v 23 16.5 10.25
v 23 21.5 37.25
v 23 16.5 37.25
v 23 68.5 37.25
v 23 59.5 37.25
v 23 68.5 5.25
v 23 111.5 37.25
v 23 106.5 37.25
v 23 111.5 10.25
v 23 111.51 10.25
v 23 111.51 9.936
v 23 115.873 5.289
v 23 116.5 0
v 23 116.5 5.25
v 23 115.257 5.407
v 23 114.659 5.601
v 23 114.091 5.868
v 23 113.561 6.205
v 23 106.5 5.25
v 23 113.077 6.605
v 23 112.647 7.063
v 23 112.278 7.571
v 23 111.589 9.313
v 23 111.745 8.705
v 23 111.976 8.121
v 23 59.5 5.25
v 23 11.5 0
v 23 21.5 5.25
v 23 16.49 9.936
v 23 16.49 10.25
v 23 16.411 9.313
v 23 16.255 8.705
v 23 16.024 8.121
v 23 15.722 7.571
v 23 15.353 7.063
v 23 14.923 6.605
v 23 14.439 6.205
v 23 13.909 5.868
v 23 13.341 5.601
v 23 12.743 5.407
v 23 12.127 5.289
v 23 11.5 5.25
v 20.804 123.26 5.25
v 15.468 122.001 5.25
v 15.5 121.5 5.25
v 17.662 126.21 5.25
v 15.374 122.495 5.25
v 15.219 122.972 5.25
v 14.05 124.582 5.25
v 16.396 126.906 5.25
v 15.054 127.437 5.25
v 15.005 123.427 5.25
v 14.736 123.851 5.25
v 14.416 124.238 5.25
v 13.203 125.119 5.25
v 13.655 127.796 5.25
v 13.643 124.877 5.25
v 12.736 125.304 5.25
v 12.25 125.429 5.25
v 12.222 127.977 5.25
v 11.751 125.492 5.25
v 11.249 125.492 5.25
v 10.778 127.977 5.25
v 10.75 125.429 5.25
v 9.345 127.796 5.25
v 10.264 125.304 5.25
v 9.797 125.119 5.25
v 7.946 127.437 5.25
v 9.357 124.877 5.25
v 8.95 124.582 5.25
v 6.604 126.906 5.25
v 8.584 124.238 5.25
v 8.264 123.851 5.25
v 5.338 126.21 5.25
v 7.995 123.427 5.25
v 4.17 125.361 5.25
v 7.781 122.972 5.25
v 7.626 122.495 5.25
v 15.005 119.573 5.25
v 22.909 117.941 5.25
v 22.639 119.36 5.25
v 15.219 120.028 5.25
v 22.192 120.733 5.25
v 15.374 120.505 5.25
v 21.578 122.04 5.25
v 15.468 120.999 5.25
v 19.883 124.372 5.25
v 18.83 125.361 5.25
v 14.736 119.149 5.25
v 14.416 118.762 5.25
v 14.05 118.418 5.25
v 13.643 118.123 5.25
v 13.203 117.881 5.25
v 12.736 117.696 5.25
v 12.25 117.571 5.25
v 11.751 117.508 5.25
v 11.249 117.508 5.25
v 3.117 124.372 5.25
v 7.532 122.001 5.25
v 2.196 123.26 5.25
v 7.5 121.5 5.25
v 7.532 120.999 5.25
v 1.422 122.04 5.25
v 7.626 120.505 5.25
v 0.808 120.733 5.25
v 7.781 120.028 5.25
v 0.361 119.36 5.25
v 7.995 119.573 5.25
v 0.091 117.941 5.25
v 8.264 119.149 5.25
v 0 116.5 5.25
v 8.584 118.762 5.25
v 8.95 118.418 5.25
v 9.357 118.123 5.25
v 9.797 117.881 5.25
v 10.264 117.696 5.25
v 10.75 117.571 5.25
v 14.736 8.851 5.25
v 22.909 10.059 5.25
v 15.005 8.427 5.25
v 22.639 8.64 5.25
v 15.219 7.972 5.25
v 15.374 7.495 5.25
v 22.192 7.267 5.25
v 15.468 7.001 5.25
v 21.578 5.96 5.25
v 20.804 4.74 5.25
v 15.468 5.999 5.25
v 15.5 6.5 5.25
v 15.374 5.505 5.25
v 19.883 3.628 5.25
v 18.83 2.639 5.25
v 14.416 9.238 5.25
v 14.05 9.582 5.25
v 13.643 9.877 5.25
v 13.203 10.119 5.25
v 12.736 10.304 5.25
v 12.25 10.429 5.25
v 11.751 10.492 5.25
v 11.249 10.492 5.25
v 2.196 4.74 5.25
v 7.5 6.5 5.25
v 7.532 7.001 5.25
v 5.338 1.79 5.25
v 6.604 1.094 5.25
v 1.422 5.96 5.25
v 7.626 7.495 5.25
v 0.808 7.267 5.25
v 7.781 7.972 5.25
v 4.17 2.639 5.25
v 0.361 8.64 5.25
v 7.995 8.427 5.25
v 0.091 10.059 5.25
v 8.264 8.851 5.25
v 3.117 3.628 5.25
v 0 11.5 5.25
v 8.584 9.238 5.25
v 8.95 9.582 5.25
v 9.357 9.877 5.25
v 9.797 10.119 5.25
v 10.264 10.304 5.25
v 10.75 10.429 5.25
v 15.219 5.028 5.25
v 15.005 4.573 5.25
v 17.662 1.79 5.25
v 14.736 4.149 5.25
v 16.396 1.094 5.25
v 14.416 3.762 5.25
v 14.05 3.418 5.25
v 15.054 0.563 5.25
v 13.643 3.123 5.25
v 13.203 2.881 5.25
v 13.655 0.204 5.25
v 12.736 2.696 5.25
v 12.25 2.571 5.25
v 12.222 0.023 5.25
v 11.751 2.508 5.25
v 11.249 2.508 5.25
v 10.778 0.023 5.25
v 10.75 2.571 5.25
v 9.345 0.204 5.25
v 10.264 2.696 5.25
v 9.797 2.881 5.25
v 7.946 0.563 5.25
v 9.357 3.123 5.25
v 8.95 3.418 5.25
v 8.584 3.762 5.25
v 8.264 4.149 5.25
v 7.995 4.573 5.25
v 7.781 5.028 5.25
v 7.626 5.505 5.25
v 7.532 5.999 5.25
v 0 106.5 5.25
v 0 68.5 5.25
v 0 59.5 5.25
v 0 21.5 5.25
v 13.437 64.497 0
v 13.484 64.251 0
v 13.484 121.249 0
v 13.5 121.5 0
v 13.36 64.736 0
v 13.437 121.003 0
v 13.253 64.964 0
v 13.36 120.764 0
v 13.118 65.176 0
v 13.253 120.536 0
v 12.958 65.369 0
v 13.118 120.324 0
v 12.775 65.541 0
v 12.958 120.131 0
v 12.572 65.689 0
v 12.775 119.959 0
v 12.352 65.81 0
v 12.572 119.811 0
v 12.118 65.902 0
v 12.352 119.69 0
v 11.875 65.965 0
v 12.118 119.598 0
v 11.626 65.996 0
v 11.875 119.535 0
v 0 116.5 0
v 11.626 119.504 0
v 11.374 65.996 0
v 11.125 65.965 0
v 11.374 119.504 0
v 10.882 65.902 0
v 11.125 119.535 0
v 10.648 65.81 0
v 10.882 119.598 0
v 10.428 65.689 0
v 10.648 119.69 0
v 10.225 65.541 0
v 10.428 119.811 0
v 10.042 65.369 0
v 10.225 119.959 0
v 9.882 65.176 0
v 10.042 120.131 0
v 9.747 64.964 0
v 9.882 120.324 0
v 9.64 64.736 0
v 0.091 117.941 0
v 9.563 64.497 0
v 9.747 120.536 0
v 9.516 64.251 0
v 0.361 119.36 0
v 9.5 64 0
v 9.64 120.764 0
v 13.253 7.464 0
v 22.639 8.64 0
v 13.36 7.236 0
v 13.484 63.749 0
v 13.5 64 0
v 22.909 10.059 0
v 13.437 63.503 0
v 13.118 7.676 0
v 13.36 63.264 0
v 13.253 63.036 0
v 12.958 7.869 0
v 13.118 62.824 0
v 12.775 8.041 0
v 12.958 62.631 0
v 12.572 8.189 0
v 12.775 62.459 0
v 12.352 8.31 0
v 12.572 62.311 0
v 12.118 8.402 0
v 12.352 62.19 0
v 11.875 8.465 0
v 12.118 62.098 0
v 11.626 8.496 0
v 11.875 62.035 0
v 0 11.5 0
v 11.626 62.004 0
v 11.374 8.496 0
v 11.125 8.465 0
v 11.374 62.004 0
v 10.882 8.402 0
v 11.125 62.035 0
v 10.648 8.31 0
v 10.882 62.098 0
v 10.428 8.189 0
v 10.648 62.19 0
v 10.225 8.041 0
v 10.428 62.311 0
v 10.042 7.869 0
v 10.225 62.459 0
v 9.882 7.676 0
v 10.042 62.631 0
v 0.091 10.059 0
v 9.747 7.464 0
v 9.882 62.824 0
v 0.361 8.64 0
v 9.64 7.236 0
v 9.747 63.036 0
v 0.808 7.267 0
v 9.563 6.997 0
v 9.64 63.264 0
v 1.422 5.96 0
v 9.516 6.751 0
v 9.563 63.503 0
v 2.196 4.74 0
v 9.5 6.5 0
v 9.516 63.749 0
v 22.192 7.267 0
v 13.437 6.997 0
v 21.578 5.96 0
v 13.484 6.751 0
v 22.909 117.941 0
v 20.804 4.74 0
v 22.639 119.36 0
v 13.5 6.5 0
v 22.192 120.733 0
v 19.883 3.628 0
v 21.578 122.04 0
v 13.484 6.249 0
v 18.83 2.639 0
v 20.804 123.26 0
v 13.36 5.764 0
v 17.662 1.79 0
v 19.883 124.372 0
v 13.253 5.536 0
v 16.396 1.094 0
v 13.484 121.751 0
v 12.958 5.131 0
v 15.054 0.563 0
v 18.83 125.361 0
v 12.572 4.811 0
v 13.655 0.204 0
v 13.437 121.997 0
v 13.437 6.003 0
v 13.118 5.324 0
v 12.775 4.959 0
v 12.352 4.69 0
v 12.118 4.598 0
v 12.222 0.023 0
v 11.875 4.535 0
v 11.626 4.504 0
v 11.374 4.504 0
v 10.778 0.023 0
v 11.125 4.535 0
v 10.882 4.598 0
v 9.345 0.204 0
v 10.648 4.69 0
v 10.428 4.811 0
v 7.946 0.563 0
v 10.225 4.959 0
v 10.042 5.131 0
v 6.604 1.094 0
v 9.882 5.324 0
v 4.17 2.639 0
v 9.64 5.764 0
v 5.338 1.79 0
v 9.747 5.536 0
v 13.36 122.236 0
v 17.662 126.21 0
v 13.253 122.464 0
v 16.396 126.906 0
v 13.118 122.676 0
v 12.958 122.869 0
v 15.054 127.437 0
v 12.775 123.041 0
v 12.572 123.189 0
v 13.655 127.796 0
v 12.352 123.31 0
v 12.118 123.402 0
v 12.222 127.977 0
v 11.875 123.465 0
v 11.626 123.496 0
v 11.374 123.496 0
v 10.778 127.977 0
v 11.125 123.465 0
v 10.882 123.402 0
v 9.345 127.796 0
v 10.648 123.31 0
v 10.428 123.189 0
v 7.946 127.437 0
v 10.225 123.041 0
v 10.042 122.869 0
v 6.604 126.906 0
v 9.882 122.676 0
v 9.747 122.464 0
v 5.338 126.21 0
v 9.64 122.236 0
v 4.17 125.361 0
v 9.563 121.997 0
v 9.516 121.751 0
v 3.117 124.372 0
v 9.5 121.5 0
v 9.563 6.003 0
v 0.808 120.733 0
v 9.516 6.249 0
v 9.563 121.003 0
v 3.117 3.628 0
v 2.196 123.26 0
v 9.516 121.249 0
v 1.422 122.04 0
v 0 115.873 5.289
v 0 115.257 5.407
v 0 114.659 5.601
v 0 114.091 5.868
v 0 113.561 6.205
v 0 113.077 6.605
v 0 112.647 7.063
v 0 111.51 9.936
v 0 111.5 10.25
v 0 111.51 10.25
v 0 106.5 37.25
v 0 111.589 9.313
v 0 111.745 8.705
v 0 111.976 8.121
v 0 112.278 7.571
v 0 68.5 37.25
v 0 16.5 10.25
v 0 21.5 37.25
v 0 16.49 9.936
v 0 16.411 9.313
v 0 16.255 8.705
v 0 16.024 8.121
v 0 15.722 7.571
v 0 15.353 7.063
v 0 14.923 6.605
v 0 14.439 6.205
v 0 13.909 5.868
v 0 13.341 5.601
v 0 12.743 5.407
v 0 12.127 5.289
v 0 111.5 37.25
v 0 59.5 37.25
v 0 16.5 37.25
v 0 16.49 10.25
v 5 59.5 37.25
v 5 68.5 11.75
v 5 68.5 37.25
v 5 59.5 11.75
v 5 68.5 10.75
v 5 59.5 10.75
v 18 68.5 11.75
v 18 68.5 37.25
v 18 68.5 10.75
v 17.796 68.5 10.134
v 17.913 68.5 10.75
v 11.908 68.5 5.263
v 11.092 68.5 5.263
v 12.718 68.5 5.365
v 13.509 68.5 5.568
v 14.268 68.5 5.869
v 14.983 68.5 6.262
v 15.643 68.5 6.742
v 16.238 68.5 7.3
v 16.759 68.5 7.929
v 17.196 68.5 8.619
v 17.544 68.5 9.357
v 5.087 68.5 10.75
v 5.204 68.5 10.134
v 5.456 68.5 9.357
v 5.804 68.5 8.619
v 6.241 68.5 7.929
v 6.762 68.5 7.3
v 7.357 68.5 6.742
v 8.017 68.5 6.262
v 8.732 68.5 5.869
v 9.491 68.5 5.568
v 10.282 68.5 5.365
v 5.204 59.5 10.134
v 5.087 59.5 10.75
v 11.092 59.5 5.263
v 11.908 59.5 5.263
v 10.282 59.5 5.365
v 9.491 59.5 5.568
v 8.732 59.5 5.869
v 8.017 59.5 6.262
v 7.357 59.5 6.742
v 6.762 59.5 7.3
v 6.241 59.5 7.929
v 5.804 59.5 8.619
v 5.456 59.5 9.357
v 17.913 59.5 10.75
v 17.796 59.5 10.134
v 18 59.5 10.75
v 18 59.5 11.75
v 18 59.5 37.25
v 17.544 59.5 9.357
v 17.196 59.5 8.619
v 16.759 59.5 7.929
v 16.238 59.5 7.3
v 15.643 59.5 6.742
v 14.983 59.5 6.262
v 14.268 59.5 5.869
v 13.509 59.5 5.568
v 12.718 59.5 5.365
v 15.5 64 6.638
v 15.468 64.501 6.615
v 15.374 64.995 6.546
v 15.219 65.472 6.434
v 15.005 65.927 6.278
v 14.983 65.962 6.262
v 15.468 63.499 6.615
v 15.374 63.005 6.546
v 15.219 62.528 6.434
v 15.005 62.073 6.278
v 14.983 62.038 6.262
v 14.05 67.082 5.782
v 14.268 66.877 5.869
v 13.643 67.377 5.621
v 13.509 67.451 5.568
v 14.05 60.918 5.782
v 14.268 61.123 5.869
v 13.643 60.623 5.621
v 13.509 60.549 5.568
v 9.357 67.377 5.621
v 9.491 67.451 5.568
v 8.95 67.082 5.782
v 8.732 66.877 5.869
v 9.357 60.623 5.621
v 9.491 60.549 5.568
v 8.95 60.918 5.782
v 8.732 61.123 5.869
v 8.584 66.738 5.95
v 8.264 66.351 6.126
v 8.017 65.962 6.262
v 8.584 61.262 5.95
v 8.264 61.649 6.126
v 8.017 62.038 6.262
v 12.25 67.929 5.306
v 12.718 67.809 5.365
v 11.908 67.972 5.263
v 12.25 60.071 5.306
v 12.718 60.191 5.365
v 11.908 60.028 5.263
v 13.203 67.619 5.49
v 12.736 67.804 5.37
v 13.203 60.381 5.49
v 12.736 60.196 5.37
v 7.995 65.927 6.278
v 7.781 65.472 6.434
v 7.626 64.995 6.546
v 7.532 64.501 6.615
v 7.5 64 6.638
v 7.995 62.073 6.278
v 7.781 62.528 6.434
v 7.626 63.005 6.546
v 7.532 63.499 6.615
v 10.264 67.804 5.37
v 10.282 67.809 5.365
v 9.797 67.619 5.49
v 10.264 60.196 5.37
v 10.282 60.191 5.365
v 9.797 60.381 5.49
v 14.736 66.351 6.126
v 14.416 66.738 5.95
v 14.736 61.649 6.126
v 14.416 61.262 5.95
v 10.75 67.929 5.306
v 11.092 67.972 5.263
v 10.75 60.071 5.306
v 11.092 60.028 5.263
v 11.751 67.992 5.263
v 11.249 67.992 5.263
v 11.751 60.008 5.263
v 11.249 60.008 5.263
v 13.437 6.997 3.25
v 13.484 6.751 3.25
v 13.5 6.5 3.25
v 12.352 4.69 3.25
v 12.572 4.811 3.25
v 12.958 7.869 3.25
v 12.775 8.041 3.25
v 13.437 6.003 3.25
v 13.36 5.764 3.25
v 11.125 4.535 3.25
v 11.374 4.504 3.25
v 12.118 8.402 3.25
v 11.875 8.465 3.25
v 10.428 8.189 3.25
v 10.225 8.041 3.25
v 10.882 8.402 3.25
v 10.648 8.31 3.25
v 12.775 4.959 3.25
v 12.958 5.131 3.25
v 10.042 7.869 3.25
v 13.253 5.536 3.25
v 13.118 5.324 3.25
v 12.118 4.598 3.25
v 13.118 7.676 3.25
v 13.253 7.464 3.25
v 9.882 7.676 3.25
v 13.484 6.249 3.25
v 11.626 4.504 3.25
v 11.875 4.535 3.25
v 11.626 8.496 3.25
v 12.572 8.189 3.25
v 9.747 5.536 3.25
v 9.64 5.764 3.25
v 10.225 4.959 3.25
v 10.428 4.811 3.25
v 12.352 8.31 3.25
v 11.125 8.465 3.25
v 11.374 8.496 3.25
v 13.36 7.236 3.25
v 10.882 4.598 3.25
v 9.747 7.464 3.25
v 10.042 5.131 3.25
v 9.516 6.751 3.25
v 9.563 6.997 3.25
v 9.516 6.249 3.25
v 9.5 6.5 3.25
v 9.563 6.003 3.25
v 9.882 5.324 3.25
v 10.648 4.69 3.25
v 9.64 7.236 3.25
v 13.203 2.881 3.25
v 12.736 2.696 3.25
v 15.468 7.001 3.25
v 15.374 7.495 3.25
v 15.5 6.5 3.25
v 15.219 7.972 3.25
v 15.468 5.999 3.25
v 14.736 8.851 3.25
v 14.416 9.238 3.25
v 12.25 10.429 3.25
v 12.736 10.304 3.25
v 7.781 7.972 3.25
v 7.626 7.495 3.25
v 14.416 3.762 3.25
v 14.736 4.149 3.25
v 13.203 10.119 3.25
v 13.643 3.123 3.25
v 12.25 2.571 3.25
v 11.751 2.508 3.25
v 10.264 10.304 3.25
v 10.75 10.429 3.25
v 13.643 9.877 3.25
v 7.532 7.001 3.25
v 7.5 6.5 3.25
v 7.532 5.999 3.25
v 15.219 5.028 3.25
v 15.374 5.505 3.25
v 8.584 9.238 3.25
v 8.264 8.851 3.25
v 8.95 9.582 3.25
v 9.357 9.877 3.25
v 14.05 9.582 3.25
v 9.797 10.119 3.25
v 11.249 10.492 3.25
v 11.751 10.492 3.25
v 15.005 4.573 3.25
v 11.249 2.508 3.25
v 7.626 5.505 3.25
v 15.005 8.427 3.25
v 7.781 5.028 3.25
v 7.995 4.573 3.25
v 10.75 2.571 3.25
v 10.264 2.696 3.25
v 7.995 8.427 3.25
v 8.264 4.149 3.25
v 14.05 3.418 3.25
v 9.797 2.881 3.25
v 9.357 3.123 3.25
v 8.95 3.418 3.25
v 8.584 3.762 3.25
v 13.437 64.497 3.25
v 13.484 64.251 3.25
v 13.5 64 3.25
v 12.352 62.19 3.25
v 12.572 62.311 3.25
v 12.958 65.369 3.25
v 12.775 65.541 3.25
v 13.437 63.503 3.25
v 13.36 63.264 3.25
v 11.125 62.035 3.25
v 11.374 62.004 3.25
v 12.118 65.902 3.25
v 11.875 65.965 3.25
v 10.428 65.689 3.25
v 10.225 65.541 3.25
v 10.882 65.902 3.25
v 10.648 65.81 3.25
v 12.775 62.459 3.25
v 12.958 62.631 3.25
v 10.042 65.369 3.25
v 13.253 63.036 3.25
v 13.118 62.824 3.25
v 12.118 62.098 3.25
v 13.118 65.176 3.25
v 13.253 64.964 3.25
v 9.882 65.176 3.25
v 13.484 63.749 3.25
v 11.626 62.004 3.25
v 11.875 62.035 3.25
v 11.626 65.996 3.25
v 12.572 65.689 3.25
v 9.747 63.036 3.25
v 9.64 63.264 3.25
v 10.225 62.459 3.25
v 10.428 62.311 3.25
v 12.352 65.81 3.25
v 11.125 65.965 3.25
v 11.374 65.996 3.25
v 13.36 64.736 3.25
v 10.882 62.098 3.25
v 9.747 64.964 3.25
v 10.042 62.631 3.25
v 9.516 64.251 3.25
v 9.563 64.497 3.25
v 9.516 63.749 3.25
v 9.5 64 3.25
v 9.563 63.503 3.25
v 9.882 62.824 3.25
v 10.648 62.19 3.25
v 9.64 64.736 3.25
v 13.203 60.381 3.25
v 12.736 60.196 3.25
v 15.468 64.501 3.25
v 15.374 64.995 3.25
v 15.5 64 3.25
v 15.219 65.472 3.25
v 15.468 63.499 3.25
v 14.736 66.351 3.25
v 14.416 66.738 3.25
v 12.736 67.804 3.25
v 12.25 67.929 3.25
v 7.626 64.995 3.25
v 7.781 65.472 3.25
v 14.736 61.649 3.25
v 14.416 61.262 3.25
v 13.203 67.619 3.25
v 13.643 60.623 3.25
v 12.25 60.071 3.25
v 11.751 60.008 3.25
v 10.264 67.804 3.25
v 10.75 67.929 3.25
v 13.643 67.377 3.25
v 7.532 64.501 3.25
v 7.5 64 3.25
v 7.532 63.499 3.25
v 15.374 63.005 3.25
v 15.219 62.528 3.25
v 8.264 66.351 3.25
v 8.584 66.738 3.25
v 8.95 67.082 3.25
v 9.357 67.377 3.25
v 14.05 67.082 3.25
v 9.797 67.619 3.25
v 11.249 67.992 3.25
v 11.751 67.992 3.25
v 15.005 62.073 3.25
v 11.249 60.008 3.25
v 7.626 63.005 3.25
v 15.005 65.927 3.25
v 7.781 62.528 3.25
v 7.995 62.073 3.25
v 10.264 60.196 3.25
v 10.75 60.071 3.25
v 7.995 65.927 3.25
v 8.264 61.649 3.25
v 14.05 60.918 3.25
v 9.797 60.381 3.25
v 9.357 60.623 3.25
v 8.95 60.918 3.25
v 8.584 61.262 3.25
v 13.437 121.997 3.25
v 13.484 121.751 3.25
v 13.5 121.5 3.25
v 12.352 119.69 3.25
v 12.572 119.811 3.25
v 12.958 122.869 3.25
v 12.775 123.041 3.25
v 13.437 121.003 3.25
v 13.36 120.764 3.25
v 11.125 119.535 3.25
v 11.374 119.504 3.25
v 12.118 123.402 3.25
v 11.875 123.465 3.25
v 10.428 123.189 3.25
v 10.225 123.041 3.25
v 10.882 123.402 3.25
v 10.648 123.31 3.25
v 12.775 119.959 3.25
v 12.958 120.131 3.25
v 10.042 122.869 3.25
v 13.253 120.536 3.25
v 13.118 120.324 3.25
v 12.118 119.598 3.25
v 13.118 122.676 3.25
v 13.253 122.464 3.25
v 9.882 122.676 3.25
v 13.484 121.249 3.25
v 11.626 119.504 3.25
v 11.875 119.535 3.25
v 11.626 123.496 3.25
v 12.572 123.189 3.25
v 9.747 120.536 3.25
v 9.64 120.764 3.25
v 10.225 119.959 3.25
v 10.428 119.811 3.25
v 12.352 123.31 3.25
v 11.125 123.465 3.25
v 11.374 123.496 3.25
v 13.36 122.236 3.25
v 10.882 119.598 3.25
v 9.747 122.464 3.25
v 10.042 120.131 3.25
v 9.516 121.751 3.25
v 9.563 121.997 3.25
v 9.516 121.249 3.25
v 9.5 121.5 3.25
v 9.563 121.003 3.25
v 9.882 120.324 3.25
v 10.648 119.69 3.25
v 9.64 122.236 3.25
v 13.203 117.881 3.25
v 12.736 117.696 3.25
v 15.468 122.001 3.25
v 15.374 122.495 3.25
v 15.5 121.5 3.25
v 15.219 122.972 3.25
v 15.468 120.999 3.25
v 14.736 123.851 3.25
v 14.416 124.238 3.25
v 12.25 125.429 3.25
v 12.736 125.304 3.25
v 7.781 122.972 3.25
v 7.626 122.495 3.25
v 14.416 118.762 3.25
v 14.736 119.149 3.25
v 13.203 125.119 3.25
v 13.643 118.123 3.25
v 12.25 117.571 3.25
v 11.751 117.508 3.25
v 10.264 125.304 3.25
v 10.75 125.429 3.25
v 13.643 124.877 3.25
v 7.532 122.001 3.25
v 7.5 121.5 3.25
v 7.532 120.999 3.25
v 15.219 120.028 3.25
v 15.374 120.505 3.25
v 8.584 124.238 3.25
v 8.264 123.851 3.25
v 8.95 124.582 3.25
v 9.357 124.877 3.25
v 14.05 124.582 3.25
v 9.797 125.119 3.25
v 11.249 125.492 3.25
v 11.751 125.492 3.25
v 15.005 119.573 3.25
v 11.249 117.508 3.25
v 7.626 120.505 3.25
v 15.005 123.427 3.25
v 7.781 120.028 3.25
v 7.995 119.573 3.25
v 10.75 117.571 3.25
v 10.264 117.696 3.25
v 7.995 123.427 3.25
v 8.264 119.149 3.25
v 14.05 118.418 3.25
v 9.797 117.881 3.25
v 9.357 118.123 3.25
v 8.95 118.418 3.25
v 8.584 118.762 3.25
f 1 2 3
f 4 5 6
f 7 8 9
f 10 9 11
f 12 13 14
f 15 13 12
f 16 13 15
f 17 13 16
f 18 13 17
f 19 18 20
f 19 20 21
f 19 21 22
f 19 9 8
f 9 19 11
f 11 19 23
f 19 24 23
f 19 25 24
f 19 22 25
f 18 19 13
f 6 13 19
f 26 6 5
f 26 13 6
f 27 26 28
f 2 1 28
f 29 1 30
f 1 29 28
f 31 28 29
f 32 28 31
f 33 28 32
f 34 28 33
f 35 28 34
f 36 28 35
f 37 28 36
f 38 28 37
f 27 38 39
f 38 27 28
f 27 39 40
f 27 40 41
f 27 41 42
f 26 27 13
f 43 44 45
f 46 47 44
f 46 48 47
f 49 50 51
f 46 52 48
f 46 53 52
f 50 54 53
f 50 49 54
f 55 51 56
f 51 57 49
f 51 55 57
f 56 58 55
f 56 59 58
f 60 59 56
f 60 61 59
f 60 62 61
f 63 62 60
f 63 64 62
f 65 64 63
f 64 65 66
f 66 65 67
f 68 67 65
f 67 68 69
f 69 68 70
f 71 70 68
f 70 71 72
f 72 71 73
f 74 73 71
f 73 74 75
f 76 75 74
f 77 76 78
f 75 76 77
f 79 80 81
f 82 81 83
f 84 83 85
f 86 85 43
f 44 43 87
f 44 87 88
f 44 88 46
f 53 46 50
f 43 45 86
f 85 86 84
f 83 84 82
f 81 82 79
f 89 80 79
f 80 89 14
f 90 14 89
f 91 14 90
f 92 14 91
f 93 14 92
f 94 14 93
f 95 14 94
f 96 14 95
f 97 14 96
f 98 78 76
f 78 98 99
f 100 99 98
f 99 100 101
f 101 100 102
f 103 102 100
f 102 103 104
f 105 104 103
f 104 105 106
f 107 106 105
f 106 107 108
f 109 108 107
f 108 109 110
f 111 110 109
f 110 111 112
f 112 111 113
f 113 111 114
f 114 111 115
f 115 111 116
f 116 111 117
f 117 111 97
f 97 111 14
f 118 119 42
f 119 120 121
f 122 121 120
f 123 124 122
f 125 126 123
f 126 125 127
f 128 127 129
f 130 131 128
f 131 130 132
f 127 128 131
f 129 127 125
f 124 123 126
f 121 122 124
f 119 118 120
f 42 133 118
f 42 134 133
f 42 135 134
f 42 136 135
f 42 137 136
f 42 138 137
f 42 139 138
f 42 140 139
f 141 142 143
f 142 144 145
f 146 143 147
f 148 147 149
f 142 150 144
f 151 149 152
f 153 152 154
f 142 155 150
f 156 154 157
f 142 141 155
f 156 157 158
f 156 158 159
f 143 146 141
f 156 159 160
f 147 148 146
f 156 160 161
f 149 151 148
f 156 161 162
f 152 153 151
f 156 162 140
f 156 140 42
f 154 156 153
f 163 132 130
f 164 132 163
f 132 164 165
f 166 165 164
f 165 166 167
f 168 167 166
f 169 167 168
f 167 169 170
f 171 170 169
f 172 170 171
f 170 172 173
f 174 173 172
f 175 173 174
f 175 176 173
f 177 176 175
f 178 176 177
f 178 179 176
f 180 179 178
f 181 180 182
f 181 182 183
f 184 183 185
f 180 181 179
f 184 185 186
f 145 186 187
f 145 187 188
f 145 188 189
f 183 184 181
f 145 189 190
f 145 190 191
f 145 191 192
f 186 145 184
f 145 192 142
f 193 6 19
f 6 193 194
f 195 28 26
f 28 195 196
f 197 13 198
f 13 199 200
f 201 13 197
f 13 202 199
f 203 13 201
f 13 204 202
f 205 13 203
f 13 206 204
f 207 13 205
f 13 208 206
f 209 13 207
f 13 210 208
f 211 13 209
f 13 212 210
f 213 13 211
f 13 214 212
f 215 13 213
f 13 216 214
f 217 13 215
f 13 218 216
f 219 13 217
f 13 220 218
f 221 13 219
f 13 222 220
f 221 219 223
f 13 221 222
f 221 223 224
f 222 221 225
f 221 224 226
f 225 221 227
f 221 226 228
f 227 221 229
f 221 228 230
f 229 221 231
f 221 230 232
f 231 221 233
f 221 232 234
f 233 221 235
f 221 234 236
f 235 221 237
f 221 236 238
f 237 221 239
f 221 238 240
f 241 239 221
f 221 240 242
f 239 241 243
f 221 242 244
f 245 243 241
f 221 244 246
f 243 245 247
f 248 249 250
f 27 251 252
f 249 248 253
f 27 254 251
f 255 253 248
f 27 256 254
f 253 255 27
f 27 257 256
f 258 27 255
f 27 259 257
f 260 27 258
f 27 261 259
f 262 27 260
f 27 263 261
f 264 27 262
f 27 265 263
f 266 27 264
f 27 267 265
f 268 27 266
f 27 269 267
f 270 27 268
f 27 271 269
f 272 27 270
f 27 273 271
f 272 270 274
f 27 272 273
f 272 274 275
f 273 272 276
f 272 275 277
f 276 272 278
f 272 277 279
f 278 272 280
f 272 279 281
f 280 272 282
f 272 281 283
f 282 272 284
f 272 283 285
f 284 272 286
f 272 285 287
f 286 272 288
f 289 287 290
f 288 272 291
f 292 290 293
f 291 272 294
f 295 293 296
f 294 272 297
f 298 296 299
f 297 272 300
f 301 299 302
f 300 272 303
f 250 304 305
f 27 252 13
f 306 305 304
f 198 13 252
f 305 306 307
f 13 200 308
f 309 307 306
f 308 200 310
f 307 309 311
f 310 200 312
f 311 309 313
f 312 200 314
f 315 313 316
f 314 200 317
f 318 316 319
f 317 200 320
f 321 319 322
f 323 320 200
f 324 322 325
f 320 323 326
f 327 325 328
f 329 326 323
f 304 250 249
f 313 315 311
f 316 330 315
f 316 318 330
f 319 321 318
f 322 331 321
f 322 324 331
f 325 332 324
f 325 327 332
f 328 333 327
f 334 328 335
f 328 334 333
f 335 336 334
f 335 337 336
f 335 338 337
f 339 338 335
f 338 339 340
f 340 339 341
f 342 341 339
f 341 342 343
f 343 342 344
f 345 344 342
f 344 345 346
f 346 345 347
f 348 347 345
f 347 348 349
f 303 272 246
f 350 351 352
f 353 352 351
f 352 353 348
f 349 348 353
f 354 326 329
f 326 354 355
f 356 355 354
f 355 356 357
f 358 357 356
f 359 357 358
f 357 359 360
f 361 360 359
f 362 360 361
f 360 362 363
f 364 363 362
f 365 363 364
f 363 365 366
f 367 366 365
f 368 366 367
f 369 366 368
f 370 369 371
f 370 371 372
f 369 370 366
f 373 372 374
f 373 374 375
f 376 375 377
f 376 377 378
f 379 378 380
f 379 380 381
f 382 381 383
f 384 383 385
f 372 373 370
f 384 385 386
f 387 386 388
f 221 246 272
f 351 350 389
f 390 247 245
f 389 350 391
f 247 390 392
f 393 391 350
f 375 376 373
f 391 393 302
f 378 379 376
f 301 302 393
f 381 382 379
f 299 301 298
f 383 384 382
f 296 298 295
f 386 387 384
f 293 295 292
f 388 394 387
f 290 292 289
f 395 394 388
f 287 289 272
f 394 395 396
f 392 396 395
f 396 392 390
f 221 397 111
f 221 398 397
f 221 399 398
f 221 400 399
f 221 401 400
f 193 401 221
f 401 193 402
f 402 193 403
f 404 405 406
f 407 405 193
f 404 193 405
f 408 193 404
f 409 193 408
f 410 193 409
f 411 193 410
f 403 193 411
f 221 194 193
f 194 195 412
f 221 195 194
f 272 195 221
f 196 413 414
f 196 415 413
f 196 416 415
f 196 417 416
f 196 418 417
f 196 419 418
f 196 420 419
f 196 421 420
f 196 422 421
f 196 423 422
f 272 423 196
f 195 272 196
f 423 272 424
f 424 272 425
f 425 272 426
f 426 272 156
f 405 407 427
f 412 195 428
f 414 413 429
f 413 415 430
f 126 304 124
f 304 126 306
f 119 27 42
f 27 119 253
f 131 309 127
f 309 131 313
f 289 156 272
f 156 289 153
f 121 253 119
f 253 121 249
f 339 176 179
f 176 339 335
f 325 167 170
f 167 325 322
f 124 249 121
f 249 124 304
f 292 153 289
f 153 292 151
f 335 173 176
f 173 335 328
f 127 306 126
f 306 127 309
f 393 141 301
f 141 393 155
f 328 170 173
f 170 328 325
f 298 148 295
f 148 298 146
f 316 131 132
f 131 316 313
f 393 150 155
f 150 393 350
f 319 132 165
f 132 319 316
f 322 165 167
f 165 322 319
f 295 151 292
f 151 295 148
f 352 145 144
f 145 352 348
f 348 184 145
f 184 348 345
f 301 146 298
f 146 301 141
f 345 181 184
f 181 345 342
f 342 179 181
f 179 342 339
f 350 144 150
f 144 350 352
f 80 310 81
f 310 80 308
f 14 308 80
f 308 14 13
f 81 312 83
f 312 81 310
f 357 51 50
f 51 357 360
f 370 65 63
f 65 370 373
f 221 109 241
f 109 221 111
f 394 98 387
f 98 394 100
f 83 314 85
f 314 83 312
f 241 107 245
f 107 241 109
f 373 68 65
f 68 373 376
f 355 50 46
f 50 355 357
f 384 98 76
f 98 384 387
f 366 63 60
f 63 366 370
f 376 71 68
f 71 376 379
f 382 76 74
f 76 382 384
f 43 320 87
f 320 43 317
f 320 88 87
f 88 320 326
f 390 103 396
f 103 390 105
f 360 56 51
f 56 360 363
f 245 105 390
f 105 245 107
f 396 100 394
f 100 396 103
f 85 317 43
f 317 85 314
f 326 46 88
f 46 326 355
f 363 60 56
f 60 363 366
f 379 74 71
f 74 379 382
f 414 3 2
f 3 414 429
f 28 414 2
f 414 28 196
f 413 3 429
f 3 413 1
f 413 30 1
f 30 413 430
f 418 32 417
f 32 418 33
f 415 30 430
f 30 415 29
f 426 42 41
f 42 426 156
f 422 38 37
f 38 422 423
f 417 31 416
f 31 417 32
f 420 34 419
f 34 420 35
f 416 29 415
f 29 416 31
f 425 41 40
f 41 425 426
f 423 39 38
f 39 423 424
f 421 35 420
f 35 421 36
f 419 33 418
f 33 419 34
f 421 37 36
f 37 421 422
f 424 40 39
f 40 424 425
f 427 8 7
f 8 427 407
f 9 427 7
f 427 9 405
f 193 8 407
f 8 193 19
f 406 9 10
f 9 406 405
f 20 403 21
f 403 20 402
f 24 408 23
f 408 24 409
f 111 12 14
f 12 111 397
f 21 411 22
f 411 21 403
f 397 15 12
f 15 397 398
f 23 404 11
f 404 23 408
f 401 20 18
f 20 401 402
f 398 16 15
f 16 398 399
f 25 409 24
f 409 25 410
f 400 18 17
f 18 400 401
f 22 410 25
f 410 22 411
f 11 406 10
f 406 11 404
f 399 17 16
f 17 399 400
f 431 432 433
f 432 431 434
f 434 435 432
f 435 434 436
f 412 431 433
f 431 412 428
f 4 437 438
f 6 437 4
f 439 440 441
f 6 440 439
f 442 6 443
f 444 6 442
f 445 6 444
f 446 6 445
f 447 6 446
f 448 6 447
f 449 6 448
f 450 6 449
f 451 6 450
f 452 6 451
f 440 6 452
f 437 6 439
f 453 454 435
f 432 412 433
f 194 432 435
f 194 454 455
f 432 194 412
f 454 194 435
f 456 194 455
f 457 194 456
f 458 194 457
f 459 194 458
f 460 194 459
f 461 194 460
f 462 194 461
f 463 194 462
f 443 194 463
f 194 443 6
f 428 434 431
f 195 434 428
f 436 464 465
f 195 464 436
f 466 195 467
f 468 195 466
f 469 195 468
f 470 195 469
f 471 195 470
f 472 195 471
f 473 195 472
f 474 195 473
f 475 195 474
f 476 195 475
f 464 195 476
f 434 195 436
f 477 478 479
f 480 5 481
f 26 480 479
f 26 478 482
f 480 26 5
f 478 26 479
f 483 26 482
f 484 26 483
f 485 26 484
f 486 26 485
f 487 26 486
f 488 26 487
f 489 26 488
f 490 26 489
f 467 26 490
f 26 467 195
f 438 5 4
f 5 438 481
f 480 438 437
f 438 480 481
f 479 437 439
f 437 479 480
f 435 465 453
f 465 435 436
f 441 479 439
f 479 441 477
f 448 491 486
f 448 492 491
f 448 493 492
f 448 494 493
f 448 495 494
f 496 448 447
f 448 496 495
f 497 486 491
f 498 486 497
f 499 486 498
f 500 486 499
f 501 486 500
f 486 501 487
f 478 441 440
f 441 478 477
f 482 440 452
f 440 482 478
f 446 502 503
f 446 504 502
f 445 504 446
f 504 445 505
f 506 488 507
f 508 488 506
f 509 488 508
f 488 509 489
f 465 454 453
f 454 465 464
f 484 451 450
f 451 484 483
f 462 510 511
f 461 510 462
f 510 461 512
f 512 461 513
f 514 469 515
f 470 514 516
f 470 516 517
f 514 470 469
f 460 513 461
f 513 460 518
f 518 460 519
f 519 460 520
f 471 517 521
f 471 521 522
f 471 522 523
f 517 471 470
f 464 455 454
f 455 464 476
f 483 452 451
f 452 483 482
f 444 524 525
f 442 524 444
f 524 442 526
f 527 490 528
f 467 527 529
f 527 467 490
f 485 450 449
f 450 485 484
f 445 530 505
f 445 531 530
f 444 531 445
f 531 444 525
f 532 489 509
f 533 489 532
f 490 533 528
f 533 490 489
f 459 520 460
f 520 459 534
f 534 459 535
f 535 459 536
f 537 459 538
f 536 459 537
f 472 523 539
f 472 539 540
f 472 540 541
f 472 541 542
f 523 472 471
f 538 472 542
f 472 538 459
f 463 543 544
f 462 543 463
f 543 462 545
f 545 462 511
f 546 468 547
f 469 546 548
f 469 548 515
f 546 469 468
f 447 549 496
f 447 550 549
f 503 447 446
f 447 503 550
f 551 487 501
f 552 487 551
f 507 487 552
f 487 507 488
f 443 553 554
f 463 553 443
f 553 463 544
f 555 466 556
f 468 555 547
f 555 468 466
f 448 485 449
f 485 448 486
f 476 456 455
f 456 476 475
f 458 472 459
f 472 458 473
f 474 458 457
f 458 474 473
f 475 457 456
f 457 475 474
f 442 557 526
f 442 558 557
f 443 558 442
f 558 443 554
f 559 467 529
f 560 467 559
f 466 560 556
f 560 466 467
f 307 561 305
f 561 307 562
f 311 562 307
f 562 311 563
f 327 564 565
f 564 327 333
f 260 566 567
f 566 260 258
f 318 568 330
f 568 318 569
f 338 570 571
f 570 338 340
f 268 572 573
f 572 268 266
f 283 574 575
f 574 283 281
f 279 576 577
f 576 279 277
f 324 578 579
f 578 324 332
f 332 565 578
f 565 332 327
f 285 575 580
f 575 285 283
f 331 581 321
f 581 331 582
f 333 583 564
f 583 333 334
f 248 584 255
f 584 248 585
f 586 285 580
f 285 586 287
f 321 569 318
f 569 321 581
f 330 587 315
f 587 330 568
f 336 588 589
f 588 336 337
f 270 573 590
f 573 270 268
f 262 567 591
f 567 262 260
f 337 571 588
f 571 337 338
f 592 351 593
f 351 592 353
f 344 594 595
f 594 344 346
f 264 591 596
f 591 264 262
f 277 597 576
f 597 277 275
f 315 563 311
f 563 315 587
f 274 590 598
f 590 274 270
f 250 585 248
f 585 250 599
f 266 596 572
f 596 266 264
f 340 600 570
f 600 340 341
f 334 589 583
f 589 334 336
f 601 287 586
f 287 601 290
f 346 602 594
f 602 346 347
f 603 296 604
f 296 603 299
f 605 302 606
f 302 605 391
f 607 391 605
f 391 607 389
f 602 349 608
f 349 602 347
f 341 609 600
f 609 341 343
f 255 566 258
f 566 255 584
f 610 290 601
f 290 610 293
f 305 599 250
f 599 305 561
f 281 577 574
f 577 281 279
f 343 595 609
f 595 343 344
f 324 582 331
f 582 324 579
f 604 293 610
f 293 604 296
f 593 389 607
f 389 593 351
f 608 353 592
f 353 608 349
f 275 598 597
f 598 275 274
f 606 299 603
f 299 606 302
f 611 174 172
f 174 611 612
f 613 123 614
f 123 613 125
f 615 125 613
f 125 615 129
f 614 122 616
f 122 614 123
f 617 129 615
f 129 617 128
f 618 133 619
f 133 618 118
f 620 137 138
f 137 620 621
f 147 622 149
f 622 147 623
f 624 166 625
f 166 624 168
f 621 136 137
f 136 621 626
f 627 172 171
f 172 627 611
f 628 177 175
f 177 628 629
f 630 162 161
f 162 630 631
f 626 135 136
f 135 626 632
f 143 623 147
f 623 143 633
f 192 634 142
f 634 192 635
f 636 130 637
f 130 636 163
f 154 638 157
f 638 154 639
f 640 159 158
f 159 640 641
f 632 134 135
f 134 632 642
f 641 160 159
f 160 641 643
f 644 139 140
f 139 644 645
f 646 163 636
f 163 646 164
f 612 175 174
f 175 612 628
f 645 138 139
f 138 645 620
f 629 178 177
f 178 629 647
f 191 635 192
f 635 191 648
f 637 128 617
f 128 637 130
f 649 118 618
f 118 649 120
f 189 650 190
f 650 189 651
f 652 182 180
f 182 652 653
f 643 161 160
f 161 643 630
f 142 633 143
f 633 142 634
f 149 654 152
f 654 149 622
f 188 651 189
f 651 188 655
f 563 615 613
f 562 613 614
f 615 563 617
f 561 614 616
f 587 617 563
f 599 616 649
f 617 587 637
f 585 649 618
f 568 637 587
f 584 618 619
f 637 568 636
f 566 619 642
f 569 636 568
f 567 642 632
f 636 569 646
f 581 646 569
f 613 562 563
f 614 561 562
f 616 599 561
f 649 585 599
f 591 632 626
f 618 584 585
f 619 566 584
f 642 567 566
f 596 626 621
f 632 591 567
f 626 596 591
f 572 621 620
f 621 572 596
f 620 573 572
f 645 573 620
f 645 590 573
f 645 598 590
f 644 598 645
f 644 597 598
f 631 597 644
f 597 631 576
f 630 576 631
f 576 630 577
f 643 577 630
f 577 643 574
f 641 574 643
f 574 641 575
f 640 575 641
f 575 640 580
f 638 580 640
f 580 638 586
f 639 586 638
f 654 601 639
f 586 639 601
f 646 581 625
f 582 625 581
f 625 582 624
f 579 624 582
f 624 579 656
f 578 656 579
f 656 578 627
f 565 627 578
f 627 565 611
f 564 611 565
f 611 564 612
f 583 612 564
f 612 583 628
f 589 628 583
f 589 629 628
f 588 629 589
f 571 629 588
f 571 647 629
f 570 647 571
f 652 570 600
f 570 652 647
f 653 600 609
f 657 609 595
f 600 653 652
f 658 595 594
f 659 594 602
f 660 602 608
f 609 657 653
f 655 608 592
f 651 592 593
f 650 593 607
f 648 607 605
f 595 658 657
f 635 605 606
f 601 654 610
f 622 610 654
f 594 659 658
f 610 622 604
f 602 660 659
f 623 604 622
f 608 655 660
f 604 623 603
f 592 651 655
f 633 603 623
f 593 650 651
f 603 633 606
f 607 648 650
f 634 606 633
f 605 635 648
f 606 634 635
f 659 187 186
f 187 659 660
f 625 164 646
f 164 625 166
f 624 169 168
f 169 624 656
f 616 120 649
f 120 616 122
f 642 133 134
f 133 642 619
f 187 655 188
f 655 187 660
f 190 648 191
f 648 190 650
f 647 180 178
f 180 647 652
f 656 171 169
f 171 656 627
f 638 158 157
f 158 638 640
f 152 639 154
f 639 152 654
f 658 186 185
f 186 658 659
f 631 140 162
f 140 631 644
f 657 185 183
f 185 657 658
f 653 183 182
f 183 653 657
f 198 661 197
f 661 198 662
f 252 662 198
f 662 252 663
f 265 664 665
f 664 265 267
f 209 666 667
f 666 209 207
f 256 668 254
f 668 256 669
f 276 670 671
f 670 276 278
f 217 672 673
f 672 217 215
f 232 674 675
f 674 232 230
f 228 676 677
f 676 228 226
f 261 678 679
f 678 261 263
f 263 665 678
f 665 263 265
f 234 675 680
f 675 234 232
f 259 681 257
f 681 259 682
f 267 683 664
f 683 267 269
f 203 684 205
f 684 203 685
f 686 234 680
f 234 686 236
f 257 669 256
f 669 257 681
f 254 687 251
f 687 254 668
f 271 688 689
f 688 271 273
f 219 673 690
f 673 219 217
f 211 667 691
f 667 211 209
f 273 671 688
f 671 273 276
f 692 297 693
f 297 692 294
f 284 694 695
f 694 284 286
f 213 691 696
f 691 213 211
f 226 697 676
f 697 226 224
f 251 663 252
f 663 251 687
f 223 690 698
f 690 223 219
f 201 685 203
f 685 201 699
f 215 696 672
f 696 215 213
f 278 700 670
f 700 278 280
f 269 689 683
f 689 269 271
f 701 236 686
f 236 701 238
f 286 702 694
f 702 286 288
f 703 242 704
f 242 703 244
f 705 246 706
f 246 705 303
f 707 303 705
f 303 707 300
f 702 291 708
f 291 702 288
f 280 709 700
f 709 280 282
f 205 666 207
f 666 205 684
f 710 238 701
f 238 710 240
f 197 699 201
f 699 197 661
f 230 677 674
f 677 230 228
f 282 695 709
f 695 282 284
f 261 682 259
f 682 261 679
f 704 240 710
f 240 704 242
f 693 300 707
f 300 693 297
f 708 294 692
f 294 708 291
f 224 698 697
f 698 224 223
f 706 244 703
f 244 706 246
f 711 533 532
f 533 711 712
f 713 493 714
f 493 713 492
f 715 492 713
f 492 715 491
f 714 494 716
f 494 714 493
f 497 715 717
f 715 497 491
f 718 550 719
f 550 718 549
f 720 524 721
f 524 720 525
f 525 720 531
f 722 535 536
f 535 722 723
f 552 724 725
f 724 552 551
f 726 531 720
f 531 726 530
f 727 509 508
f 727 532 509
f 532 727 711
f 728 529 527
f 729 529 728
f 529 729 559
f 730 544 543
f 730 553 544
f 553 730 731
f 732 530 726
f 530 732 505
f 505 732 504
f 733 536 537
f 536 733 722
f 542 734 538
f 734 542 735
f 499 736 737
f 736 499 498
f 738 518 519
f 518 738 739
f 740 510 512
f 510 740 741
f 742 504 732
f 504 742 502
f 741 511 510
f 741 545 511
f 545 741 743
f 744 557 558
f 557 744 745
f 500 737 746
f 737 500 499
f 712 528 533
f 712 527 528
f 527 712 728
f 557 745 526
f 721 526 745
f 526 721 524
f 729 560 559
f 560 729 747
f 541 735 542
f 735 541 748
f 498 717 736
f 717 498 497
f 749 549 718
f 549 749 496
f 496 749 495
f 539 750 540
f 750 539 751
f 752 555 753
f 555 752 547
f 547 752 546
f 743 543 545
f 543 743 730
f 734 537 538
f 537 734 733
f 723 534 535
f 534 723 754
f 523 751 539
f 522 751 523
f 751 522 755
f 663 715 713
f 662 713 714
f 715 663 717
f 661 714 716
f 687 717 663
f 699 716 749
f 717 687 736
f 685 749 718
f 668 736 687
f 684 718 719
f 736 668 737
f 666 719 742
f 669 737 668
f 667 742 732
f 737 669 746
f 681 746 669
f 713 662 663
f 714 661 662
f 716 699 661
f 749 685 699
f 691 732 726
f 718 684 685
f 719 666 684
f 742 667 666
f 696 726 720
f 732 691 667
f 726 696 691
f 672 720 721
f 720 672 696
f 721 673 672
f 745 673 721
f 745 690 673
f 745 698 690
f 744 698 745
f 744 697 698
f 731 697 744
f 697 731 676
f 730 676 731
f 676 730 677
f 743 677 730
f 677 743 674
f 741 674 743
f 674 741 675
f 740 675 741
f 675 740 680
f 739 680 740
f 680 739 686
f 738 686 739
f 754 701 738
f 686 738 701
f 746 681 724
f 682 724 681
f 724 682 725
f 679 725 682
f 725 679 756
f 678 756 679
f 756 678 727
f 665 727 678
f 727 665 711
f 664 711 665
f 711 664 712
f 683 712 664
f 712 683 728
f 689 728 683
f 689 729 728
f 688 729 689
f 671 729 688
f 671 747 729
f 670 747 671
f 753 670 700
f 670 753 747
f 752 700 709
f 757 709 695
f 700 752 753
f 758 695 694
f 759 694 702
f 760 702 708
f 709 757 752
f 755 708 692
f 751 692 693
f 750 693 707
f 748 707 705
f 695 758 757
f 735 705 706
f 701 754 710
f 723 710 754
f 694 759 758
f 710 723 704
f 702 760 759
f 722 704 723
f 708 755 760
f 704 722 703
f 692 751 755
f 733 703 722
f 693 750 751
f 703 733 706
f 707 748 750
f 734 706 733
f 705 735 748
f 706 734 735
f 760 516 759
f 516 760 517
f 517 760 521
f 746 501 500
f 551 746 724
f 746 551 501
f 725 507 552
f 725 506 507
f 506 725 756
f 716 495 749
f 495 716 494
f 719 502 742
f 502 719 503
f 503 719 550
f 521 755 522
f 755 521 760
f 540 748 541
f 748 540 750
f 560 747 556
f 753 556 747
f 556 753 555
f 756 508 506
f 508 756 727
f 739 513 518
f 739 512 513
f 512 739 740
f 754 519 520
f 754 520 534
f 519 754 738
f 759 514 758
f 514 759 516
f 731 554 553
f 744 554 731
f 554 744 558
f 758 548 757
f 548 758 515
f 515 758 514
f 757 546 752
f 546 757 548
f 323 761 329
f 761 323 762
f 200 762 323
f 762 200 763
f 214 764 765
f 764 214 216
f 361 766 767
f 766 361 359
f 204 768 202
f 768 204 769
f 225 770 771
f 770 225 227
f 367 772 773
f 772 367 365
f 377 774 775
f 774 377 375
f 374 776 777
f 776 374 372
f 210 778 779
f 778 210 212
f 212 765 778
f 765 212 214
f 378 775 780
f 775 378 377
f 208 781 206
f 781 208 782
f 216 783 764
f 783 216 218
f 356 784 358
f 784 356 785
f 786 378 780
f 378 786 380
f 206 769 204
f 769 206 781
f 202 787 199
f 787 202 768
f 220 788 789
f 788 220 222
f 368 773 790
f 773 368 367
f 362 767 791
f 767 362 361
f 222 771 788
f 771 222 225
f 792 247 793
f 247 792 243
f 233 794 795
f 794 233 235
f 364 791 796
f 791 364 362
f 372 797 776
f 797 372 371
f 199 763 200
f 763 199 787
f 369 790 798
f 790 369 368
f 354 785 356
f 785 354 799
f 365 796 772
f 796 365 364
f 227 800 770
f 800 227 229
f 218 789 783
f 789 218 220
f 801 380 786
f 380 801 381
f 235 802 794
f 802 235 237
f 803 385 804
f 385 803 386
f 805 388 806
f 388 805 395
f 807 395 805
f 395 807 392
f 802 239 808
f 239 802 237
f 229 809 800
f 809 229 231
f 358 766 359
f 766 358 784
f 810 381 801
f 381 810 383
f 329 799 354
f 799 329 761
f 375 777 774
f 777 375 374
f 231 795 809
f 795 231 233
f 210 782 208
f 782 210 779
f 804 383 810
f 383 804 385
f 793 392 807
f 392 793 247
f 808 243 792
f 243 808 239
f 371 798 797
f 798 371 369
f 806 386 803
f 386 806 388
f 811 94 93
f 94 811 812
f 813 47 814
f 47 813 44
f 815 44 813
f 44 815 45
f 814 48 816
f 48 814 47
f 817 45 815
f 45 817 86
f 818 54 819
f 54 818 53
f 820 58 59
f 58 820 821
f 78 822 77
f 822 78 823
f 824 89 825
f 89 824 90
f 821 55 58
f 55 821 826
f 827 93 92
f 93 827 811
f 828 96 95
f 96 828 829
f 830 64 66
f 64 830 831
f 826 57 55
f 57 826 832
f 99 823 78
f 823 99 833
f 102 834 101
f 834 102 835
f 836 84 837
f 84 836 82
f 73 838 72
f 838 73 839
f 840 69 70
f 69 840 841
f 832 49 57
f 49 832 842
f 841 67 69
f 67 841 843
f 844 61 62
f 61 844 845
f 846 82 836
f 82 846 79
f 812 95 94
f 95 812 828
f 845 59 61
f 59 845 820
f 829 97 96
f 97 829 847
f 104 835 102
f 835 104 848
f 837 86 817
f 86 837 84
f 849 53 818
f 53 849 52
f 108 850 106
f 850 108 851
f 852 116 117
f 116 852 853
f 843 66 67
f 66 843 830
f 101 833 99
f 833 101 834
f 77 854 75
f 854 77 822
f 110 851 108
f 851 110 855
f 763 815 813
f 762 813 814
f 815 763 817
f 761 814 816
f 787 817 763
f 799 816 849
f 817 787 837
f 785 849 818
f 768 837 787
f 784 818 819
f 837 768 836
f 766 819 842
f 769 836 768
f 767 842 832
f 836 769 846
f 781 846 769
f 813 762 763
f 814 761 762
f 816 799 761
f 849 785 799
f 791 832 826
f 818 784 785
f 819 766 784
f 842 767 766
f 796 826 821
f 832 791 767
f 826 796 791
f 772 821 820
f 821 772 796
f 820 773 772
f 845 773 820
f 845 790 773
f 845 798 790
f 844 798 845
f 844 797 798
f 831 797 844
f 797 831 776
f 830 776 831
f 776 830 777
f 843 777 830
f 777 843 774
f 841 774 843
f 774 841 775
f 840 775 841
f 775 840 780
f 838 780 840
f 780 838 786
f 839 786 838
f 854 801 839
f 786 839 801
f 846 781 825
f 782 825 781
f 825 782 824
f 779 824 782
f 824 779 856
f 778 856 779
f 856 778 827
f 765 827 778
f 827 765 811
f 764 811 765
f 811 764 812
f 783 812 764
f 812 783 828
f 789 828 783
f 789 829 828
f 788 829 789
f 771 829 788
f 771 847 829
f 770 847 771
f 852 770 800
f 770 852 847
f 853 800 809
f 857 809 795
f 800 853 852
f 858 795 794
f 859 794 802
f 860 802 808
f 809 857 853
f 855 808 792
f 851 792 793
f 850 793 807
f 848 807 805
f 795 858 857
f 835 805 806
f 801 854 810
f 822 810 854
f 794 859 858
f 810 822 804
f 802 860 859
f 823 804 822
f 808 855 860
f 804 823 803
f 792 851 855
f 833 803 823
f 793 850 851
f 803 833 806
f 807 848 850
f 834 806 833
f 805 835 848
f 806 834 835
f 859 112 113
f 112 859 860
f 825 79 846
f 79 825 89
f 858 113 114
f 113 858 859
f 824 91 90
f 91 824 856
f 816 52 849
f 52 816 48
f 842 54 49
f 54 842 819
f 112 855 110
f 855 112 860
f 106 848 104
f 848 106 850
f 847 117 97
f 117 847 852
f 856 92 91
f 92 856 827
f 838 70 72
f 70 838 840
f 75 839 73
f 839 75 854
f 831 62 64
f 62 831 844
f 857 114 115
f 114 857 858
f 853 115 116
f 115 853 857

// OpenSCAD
/* [Basic Settings] */

// The height of the entire item, from the bottom of the base to the top of the posts.
total_height = 32; // [20:40]

// The height of the base, not including the posts.
base_height = 5.25; // [2:0.25:10]

// The width of the item.
base_width = 23; // [20:30]

/* [Post Settings] */

// How thick should the posts be?
post_thickness = 5; // [3:10]

// How much distance between posts is needed for the door to slide through?
distance_between_posts = 38; // [20:50]

/* [Screw Hole Settings] */

// The radius of the pilot holes for the screws.
screw_hole_radius=2; // [1:0.25:3]

// The depth to sink the screw heads.
screw_sink_depth=2; // [1:0.25:4]

// The radius needed to sink the screw heads.
screw_sink_radius=4; // [1:0.25:5]

// calculated values
overlap_pad = 1*1;
base_padding = 5*1;
function center_post_dimensions() = [post_thickness,9,total_height+overlap_pad];
function outside_post_dimensions() = [base_width,post_thickness,total_height+overlap_pad];
base_length = center_post_dimensions()[1] + (outside_post_dimensions()[1]*2) + (distance_between_posts*2) + (base_padding*2);
radial_segments = 50*1;

module create_base()
  union () {
    translate([0, base_width/2, 0])
      cube([base_width, base_length, base_height]);
    translate([base_width/2, base_width/2, 0])
      cylinder(h=base_height,r=base_width/2,$fn=radial_segments);
    translate([base_width/2, base_width/2+base_length, 0])
      cylinder(h=base_height,r=base_width/2,$fn=radial_segments);
  }

module near_post()
  difference () {
    union () {
      translate([0, base_width/2+base_padding, base_height-overlap_pad])
        cube(outside_post_dimensions());
      translate([0, base_width/2, base_height-overlap_pad])
        cube([base_width, base_padding, base_padding+overlap_pad]);
    }
    translate([-1*overlap_pad,(base_width/2),base_height+base_padding])
      rotate([0,90,0])
        cylinder(h=base_width+(overlap_pad*2),r=(base_padding),$fn=radial_segments);
  }

module far_post()
  difference () {
    union () {
      translate([0, base_width/2+base_length-base_padding-outside_post_dimensions()[1],base_height-overlap_pad])
        cube(outside_post_dimensions());
      translate([0, base_width/2+base_length-base_padding,base_height-overlap_pad])
        cube([base_width, base_padding, base_padding+overlap_pad]);
    }
    translate([-1*overlap_pad,(base_width/2)+base_length,base_height+base_padding])
      rotate([0,90,0])
        cylinder(h=base_width+(overlap_pad*2),r=(base_padding),$fn=radial_segments);
  }

module center_posts()
  difference () {
    union () {
      translate([0, (base_width/2+base_length/2)-center_post_dimensions()[1]/2,base_height-overlap_pad])
        cube(center_post_dimensions());
      translate([base_width-center_post_dimensions()[0], (base_width/2+base_length/2)-center_post_dimensions()[1]/2,base_height-overlap_pad])
        cube(center_post_dimensions());
      translate([center_post_dimensions()[0]-overlap_pad, (base_width/2+base_length/2)-center_post_dimensions()[1]/2,base_height-overlap_pad])
        cube([(base_width-(center_post_dimensions()[0]-overlap_pad)*2), center_post_dimensions()[1], (base_width-center_post_dimensions()[0]*2)/2]);
    }
    translate([base_width/2, ((base_width/2+base_length/2)-center_post_dimensions()[1]/2)-overlap_pad,base_height+(base_width-center_post_dimensions()[0]*2)/2])
      rotate([270,0,0])
        cylinder(h=base_width+(overlap_pad*2),r=(base_width-center_post_dimensions()[0]*2)/2,$fn=radial_segments);

  }

module screw_holes()
  union () {
    translate([base_width/2,base_width/2-base_padding,0-overlap_pad])
      cylinder(h=base_height+(overlap_pad*10),r=screw_hole_radius,$fn=radial_segments);
    translate([base_width/2,base_width/2-base_padding,base_height-screw_sink_depth])
      cylinder(h=screw_sink_depth+10,r=screw_sink_radius,$fn=radial_segments);

    translate([base_width/2,base_width/2+base_length/2,0-overlap_pad])
      cylinder(h=base_height+(overlap_pad*10),r=screw_hole_radius,$fn=radial_segments);
    translate([base_width/2,base_width/2+base_length/2,base_height-screw_sink_depth])
      cylinder(h=screw_sink_depth+10,r=screw_sink_radius,$fn=radial_segments);

    translate([base_width/2,base_width/2+base_length+base_padding,0-overlap_pad])
      cylinder(h=base_height+(overlap_pad*10),r=screw_hole_radius,$fn=radial_segments);
    translate([base_width/2,base_width/2+base_length+base_padding,base_height-screw_sink_depth])
      cylinder(h=screw_sink_depth+10,r=screw_sink_radius,$fn=radial_segments);
  }

difference () {
  union () {
    create_base();
    near_post();
    far_post();
    center_posts();
  }
  screw_holes();
}
